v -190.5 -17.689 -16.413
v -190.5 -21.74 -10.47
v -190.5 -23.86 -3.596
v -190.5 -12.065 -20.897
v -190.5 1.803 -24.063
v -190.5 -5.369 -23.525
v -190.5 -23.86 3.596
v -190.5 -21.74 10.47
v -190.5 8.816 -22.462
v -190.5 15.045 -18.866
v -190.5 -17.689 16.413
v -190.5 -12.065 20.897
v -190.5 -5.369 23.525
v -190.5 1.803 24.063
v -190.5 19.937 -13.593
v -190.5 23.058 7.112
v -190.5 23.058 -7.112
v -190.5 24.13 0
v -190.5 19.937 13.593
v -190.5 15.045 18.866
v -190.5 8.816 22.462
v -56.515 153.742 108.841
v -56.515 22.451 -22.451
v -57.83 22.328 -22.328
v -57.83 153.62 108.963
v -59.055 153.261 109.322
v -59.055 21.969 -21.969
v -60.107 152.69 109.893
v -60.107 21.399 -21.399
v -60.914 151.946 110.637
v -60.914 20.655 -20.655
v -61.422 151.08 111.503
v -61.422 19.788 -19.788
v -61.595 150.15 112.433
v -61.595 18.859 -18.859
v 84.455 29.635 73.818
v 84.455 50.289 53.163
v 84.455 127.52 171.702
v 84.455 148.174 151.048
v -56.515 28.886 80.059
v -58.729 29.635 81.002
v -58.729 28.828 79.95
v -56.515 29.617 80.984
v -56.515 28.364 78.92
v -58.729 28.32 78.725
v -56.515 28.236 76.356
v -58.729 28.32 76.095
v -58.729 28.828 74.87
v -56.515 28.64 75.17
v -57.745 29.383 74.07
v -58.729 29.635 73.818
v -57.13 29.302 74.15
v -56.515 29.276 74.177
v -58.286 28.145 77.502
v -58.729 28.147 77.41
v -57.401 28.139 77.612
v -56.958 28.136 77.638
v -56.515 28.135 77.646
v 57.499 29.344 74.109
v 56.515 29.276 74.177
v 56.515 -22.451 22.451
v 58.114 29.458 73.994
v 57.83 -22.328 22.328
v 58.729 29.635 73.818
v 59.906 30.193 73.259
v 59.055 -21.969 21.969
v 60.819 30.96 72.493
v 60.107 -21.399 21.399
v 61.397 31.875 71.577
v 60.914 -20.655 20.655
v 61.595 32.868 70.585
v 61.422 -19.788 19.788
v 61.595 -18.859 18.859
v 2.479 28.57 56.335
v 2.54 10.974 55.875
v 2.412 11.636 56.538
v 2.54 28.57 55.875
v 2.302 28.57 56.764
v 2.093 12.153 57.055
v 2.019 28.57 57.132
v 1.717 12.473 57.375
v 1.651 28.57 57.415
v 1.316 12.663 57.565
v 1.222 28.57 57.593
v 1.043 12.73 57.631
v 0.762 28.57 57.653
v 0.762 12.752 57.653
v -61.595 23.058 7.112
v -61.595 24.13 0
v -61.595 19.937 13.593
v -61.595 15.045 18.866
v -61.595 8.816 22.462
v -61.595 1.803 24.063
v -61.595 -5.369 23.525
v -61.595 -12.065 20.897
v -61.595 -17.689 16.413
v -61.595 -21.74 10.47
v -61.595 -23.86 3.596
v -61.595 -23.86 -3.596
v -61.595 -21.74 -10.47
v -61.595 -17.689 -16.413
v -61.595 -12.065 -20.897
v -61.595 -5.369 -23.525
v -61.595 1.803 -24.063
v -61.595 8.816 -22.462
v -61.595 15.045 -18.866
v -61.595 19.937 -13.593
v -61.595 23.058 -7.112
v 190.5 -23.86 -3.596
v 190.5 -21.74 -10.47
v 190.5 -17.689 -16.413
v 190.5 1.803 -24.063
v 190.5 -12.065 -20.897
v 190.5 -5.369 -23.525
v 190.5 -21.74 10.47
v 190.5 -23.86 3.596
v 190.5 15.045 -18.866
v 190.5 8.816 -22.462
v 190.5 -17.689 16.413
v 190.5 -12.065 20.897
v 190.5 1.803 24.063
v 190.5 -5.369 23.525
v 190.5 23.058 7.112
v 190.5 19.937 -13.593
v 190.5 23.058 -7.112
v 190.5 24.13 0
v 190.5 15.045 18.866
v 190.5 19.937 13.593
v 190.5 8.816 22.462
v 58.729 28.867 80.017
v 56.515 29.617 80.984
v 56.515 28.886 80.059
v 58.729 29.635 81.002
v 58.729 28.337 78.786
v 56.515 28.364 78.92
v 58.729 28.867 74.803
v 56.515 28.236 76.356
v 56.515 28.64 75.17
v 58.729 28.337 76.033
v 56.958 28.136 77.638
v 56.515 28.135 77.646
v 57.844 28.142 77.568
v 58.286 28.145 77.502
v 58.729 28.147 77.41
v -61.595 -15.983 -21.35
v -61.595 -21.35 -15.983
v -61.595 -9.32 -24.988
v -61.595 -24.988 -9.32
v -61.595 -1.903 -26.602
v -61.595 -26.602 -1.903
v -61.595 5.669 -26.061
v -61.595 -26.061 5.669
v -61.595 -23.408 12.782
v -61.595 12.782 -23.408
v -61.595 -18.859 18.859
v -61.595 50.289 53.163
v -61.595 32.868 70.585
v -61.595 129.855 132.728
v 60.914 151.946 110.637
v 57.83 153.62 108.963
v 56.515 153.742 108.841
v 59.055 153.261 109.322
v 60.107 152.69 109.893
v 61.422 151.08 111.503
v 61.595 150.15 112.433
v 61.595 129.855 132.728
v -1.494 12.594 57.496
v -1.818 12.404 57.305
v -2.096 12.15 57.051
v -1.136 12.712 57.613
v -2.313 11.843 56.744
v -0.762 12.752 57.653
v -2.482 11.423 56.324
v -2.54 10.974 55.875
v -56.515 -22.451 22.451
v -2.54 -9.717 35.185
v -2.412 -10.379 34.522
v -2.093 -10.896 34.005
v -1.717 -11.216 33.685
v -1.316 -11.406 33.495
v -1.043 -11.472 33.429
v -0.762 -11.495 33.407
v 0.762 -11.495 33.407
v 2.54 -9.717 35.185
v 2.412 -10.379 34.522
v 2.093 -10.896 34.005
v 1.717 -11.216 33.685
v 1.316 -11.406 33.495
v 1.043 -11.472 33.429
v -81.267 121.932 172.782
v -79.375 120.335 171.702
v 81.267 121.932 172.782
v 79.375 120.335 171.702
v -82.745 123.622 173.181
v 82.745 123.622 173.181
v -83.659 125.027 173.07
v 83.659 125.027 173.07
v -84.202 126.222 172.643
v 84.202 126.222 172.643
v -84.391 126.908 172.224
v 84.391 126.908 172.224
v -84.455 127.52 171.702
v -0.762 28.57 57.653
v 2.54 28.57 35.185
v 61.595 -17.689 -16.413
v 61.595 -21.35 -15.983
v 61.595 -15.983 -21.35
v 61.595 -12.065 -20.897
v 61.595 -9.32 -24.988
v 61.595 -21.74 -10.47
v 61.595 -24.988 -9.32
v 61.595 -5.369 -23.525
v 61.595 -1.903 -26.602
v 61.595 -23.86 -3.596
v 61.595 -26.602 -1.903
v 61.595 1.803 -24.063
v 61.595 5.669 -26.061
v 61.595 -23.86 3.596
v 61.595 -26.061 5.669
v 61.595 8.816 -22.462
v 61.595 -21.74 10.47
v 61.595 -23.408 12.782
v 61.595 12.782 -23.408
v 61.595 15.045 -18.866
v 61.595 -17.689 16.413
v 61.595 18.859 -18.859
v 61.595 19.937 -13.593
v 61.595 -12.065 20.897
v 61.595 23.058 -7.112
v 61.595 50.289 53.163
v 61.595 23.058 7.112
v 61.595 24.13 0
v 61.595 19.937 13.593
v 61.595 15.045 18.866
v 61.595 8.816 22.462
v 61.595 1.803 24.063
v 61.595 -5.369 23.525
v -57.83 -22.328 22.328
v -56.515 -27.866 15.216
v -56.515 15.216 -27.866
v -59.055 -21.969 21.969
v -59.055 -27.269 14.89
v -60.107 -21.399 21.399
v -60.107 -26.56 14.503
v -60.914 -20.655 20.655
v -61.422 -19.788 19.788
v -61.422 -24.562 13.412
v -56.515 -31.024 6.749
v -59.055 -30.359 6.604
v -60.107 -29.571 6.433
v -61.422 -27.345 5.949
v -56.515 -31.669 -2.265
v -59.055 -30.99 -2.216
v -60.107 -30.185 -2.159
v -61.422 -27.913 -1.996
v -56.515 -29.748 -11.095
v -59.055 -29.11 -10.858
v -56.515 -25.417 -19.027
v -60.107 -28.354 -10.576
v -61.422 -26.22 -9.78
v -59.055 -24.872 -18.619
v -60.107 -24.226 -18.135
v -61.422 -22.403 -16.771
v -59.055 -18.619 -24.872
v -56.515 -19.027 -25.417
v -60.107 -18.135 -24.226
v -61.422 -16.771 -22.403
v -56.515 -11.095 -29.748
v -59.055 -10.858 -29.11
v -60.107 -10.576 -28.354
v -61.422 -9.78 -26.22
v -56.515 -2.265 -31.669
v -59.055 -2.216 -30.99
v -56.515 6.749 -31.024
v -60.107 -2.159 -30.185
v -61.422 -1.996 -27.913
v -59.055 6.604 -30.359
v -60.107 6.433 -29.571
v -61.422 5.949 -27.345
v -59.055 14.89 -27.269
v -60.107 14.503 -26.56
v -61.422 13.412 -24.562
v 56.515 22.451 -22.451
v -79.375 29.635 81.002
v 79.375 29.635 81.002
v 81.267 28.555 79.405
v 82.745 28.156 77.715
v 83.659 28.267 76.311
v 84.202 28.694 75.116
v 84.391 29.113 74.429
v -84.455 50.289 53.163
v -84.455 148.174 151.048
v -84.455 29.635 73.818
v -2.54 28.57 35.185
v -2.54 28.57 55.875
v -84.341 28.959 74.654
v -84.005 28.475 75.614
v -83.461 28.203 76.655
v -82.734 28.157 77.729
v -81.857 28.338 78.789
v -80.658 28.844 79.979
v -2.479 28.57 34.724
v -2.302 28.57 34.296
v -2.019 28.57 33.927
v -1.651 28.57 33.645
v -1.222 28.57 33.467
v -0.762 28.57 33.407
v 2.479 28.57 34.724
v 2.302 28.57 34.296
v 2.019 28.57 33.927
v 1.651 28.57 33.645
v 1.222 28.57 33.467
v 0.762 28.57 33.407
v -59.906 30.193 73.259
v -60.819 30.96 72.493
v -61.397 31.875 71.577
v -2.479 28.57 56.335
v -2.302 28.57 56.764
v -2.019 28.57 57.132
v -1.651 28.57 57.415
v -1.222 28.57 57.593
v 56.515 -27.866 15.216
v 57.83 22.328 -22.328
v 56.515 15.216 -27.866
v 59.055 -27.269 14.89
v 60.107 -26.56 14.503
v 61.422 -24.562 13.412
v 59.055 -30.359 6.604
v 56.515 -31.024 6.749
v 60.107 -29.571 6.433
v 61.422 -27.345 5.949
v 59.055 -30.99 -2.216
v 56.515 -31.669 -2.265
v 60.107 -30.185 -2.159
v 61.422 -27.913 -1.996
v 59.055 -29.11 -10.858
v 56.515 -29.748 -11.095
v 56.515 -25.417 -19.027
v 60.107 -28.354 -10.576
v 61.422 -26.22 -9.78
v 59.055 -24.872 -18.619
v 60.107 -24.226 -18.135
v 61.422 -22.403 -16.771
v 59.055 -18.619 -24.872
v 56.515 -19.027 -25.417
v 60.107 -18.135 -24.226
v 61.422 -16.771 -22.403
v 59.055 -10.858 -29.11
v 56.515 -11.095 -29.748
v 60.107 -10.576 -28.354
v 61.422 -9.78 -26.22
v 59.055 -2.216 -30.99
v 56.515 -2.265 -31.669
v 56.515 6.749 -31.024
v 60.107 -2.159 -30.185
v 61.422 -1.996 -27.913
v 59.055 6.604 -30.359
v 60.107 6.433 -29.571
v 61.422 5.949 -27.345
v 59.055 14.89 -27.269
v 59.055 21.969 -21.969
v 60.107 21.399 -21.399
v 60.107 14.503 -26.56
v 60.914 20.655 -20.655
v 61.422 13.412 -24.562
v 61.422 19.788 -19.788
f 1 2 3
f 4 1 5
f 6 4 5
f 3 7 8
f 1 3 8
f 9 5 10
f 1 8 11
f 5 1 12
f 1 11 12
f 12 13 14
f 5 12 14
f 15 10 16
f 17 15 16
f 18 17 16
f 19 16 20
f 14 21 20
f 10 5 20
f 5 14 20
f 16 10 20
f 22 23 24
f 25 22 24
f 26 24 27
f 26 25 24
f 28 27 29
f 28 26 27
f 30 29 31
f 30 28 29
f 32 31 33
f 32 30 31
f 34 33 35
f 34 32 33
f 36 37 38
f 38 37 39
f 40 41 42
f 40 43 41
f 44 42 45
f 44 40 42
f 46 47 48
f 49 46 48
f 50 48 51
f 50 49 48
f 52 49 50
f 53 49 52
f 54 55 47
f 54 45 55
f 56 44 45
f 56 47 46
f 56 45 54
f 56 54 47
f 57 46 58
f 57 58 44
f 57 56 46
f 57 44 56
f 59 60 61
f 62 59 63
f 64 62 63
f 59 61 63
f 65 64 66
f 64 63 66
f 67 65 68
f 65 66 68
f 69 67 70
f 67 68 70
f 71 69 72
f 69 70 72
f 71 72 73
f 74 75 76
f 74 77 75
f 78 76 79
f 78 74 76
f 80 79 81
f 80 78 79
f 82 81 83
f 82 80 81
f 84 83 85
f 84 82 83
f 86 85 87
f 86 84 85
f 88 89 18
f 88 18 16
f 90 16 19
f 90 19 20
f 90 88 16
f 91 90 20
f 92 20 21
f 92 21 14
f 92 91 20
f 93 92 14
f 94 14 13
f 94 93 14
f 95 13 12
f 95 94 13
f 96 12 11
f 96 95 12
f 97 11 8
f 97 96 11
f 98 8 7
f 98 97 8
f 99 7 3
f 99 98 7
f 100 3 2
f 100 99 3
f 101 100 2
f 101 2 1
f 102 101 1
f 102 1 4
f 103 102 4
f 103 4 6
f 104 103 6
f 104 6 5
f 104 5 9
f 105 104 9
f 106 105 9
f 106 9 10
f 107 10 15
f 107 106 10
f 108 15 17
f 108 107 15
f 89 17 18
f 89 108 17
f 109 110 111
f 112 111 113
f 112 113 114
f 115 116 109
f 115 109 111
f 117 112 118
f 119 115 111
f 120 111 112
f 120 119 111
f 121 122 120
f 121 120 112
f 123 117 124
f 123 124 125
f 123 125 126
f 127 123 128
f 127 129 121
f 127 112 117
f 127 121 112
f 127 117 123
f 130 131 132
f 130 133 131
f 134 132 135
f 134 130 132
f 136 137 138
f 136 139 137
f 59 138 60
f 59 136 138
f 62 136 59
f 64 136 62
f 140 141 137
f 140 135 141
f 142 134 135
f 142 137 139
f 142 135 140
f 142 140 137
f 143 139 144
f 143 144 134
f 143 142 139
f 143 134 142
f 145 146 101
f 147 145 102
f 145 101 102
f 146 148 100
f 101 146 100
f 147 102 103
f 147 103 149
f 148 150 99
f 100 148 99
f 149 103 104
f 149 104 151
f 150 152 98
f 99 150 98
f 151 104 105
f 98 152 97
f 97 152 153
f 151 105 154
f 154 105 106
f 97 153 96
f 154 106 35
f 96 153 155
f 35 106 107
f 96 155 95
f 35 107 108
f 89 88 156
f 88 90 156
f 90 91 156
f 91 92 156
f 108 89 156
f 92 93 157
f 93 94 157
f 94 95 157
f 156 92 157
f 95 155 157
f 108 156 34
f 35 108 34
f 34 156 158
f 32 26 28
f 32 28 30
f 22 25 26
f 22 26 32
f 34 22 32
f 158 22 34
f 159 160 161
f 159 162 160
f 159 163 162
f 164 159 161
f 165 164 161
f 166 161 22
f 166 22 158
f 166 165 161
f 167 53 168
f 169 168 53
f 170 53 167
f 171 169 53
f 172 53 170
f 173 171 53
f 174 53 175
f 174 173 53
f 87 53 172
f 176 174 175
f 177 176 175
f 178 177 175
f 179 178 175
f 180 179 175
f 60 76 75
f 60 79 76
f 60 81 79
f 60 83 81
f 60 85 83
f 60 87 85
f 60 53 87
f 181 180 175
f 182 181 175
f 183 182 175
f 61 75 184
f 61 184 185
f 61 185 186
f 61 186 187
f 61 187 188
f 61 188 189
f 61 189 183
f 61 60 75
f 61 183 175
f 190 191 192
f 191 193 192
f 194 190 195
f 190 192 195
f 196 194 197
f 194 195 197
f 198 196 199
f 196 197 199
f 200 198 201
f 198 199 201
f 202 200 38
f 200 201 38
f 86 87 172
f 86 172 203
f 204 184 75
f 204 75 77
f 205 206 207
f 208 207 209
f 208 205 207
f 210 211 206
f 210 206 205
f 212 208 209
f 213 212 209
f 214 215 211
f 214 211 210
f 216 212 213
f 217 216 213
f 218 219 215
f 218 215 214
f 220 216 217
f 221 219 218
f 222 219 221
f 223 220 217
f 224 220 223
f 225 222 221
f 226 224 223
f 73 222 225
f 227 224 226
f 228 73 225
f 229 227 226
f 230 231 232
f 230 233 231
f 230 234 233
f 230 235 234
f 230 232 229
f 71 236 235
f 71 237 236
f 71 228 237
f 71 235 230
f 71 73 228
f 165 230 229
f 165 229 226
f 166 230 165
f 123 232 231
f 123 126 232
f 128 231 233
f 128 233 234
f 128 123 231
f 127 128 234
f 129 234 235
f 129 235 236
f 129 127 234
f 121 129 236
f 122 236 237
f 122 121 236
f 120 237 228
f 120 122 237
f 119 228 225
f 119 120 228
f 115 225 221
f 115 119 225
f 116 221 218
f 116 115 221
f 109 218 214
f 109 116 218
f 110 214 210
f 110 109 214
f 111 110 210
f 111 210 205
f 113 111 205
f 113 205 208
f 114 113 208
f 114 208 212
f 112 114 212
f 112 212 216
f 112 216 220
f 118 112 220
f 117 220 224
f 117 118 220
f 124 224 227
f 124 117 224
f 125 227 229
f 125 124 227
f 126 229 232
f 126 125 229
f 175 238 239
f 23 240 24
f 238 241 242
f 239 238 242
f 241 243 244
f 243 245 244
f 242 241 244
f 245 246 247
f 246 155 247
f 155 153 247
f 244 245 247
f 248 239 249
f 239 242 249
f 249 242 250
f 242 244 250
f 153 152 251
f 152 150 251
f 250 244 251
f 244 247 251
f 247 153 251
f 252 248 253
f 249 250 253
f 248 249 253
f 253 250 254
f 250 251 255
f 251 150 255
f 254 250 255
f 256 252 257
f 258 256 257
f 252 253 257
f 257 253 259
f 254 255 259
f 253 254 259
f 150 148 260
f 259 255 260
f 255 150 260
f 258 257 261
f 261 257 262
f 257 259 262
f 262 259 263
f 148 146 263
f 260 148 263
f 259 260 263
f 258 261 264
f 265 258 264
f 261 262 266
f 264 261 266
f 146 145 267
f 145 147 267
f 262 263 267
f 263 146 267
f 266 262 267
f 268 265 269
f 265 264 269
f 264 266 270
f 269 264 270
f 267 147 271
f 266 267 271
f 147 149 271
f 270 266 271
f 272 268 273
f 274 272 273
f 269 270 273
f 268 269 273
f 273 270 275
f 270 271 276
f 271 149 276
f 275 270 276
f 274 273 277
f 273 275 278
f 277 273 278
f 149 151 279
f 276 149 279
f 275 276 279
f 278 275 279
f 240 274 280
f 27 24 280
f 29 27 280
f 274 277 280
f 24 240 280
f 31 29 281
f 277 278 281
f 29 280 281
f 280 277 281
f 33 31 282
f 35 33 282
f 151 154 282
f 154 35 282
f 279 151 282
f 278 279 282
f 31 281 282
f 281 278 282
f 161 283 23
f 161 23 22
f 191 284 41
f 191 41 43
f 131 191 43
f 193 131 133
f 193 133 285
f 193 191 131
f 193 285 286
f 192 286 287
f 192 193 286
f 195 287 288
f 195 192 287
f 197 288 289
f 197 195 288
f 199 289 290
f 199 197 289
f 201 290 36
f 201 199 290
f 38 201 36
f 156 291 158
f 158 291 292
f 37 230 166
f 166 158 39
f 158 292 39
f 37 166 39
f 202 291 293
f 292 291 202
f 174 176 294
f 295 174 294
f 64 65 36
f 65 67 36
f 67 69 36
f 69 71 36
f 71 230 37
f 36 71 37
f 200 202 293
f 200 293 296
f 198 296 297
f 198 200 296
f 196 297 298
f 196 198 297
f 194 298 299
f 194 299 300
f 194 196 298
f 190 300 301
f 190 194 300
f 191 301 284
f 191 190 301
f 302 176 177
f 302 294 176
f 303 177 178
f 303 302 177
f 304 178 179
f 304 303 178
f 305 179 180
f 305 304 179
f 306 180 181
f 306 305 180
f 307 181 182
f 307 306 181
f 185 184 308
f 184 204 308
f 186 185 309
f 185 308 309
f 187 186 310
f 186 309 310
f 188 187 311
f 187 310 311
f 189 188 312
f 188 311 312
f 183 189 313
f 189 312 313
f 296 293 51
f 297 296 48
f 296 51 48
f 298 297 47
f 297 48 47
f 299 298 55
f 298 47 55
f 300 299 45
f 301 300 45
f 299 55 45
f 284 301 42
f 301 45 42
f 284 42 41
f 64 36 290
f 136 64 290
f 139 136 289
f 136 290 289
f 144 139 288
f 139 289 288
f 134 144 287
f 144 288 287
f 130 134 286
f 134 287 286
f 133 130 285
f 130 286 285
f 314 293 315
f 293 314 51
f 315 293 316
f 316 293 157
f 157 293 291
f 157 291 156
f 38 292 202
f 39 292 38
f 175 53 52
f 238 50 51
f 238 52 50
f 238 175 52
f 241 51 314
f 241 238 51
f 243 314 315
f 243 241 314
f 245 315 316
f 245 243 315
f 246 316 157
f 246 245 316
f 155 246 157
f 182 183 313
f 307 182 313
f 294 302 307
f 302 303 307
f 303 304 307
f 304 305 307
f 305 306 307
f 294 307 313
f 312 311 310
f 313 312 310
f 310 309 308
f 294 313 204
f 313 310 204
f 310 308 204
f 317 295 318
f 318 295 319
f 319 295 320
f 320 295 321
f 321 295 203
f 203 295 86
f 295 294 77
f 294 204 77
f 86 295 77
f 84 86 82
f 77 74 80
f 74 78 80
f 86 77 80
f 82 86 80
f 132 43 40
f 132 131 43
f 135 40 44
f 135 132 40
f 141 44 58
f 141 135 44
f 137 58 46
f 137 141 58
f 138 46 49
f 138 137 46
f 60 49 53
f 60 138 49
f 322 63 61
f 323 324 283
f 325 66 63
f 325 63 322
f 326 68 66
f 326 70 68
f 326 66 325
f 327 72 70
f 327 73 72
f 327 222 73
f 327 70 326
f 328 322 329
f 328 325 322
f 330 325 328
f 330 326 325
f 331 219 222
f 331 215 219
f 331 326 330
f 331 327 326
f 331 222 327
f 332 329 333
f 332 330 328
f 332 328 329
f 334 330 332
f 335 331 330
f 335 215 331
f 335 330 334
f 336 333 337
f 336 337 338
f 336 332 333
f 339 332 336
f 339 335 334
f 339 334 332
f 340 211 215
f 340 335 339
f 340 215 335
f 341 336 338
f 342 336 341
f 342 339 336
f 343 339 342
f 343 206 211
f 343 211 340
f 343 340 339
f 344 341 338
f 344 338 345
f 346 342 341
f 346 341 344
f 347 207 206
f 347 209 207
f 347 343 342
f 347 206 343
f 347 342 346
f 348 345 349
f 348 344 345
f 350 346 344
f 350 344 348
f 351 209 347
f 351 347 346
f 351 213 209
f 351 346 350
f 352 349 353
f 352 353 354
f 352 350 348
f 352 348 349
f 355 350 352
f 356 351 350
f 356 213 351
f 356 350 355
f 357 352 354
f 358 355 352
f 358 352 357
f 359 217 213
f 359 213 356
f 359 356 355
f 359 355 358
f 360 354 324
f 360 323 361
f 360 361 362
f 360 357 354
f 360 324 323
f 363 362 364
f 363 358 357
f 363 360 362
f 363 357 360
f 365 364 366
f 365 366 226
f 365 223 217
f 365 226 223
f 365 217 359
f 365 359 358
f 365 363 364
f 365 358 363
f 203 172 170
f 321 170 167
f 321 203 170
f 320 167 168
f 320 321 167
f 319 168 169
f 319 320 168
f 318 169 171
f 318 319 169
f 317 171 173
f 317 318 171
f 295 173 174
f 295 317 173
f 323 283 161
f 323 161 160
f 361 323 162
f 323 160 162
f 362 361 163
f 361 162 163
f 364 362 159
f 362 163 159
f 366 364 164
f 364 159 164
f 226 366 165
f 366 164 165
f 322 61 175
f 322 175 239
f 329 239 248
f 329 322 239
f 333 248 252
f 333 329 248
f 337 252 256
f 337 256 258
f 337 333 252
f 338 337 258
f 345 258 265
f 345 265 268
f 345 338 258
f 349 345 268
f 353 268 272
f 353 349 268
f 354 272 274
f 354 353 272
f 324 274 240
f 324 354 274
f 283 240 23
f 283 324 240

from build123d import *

# Parameters (mm, degrees)
F3_DEPTH  = 61.595
F4_W      = 168.91
F4_H      = 138.43
F5_DEPTH  = 34.29
F6_W      = 80.128736575
F6_H      = 24.2466915269
F7_DEPTH  = 2.54
F8_R      = 1.778
F9_R      = 5.08
F10_R     = 5.08
F11_R     = 24.13
F12_DEPTH = 190.5


with BuildPart() as f3:
    # F2 (on Right) → F3 (new body, symmetric)
    with BuildSketch(Plane.YZ):
        with BuildLine():
            Line((29.2756349547, 74.17691556), (-22.4506403027, 22.4506403027))
            ThreePointArc((-22.4506403027, 22.4506403027), (-22.4506403027, -22.4506403027), (22.4506403027, -22.4506403027))
            Line((22.4506403027, -22.4506403027), (153.7419847927, 108.8407041874))
            Line((153.7419847927, 108.8407041874), (129.8545035107, 132.7281854694))
            Line((129.8545035107, 132.7281854694), (50.289434278, 53.1631162367))
            Line((50.289434278, 53.1631162367), (29.2756349547, 74.17691556))
        make_face()
    extrude(amount=F3_DEPTH, both=True)

    # F4 (on face) → F5 (join)
    with BuildSketch(Plane(origin=(0, -1.4368409794, 1.4368409794), x_dir=(1, 0, 0), z_dir=(0, -0.7071067812, 0.7071067812))):
        with Locations((0, 142.367)):
            Rectangle(F4_W, F4_H)
    extrude(amount=F5_DEPTH)

    # F6 (on Right) → F7 (cut, symmetric)
    with BuildSketch(Plane.YZ):
        with Locations((-11.494727835, 45.5298985338)):
            Rectangle(F6_W, F6_H)
    extrude(amount=F7_DEPTH, both=True, mode=Mode.SUBTRACT)

    # F8
    f8_edges = [f3.edges().sort_by_distance(p)[0] for p in [
        (2.54, 20.660802, 57.653244),
        (-2.54, 20.660802, 57.653244),
        (2.54, 8.537456, 33.406553),
        (-2.54, 8.537456, 33.406553),
    ]]
    fillet(f8_edges, radius=F8_R)

    # F9
    f9_edges = [f3.edges().sort_by_distance(p)[0] for p in [
        (-61.595, 3.412497, 48.313778),
        (61.595, 3.412497, 48.313778),
    ]]
    fillet(f9_edges, radius=F9_R)

    # F10
    f10_edges = [f3.edges().sort_by_distance(p)[0] for p in [
        (84.455, 74.985139, 126.352204),
        (0, 123.927534, 175.294599),
        (-84.455, 74.985139, 126.352204),
        (0, 26.042743, 77.409808),
    ]]
    fillet(f10_edges, radius=F10_R)

    # F11 (on Right) → F12 (join, symmetric)
    with BuildSketch(Plane.YZ):
        Circle(F11_R)
    extrude(amount=F12_DEPTH, both=True)


solid = f3.part
